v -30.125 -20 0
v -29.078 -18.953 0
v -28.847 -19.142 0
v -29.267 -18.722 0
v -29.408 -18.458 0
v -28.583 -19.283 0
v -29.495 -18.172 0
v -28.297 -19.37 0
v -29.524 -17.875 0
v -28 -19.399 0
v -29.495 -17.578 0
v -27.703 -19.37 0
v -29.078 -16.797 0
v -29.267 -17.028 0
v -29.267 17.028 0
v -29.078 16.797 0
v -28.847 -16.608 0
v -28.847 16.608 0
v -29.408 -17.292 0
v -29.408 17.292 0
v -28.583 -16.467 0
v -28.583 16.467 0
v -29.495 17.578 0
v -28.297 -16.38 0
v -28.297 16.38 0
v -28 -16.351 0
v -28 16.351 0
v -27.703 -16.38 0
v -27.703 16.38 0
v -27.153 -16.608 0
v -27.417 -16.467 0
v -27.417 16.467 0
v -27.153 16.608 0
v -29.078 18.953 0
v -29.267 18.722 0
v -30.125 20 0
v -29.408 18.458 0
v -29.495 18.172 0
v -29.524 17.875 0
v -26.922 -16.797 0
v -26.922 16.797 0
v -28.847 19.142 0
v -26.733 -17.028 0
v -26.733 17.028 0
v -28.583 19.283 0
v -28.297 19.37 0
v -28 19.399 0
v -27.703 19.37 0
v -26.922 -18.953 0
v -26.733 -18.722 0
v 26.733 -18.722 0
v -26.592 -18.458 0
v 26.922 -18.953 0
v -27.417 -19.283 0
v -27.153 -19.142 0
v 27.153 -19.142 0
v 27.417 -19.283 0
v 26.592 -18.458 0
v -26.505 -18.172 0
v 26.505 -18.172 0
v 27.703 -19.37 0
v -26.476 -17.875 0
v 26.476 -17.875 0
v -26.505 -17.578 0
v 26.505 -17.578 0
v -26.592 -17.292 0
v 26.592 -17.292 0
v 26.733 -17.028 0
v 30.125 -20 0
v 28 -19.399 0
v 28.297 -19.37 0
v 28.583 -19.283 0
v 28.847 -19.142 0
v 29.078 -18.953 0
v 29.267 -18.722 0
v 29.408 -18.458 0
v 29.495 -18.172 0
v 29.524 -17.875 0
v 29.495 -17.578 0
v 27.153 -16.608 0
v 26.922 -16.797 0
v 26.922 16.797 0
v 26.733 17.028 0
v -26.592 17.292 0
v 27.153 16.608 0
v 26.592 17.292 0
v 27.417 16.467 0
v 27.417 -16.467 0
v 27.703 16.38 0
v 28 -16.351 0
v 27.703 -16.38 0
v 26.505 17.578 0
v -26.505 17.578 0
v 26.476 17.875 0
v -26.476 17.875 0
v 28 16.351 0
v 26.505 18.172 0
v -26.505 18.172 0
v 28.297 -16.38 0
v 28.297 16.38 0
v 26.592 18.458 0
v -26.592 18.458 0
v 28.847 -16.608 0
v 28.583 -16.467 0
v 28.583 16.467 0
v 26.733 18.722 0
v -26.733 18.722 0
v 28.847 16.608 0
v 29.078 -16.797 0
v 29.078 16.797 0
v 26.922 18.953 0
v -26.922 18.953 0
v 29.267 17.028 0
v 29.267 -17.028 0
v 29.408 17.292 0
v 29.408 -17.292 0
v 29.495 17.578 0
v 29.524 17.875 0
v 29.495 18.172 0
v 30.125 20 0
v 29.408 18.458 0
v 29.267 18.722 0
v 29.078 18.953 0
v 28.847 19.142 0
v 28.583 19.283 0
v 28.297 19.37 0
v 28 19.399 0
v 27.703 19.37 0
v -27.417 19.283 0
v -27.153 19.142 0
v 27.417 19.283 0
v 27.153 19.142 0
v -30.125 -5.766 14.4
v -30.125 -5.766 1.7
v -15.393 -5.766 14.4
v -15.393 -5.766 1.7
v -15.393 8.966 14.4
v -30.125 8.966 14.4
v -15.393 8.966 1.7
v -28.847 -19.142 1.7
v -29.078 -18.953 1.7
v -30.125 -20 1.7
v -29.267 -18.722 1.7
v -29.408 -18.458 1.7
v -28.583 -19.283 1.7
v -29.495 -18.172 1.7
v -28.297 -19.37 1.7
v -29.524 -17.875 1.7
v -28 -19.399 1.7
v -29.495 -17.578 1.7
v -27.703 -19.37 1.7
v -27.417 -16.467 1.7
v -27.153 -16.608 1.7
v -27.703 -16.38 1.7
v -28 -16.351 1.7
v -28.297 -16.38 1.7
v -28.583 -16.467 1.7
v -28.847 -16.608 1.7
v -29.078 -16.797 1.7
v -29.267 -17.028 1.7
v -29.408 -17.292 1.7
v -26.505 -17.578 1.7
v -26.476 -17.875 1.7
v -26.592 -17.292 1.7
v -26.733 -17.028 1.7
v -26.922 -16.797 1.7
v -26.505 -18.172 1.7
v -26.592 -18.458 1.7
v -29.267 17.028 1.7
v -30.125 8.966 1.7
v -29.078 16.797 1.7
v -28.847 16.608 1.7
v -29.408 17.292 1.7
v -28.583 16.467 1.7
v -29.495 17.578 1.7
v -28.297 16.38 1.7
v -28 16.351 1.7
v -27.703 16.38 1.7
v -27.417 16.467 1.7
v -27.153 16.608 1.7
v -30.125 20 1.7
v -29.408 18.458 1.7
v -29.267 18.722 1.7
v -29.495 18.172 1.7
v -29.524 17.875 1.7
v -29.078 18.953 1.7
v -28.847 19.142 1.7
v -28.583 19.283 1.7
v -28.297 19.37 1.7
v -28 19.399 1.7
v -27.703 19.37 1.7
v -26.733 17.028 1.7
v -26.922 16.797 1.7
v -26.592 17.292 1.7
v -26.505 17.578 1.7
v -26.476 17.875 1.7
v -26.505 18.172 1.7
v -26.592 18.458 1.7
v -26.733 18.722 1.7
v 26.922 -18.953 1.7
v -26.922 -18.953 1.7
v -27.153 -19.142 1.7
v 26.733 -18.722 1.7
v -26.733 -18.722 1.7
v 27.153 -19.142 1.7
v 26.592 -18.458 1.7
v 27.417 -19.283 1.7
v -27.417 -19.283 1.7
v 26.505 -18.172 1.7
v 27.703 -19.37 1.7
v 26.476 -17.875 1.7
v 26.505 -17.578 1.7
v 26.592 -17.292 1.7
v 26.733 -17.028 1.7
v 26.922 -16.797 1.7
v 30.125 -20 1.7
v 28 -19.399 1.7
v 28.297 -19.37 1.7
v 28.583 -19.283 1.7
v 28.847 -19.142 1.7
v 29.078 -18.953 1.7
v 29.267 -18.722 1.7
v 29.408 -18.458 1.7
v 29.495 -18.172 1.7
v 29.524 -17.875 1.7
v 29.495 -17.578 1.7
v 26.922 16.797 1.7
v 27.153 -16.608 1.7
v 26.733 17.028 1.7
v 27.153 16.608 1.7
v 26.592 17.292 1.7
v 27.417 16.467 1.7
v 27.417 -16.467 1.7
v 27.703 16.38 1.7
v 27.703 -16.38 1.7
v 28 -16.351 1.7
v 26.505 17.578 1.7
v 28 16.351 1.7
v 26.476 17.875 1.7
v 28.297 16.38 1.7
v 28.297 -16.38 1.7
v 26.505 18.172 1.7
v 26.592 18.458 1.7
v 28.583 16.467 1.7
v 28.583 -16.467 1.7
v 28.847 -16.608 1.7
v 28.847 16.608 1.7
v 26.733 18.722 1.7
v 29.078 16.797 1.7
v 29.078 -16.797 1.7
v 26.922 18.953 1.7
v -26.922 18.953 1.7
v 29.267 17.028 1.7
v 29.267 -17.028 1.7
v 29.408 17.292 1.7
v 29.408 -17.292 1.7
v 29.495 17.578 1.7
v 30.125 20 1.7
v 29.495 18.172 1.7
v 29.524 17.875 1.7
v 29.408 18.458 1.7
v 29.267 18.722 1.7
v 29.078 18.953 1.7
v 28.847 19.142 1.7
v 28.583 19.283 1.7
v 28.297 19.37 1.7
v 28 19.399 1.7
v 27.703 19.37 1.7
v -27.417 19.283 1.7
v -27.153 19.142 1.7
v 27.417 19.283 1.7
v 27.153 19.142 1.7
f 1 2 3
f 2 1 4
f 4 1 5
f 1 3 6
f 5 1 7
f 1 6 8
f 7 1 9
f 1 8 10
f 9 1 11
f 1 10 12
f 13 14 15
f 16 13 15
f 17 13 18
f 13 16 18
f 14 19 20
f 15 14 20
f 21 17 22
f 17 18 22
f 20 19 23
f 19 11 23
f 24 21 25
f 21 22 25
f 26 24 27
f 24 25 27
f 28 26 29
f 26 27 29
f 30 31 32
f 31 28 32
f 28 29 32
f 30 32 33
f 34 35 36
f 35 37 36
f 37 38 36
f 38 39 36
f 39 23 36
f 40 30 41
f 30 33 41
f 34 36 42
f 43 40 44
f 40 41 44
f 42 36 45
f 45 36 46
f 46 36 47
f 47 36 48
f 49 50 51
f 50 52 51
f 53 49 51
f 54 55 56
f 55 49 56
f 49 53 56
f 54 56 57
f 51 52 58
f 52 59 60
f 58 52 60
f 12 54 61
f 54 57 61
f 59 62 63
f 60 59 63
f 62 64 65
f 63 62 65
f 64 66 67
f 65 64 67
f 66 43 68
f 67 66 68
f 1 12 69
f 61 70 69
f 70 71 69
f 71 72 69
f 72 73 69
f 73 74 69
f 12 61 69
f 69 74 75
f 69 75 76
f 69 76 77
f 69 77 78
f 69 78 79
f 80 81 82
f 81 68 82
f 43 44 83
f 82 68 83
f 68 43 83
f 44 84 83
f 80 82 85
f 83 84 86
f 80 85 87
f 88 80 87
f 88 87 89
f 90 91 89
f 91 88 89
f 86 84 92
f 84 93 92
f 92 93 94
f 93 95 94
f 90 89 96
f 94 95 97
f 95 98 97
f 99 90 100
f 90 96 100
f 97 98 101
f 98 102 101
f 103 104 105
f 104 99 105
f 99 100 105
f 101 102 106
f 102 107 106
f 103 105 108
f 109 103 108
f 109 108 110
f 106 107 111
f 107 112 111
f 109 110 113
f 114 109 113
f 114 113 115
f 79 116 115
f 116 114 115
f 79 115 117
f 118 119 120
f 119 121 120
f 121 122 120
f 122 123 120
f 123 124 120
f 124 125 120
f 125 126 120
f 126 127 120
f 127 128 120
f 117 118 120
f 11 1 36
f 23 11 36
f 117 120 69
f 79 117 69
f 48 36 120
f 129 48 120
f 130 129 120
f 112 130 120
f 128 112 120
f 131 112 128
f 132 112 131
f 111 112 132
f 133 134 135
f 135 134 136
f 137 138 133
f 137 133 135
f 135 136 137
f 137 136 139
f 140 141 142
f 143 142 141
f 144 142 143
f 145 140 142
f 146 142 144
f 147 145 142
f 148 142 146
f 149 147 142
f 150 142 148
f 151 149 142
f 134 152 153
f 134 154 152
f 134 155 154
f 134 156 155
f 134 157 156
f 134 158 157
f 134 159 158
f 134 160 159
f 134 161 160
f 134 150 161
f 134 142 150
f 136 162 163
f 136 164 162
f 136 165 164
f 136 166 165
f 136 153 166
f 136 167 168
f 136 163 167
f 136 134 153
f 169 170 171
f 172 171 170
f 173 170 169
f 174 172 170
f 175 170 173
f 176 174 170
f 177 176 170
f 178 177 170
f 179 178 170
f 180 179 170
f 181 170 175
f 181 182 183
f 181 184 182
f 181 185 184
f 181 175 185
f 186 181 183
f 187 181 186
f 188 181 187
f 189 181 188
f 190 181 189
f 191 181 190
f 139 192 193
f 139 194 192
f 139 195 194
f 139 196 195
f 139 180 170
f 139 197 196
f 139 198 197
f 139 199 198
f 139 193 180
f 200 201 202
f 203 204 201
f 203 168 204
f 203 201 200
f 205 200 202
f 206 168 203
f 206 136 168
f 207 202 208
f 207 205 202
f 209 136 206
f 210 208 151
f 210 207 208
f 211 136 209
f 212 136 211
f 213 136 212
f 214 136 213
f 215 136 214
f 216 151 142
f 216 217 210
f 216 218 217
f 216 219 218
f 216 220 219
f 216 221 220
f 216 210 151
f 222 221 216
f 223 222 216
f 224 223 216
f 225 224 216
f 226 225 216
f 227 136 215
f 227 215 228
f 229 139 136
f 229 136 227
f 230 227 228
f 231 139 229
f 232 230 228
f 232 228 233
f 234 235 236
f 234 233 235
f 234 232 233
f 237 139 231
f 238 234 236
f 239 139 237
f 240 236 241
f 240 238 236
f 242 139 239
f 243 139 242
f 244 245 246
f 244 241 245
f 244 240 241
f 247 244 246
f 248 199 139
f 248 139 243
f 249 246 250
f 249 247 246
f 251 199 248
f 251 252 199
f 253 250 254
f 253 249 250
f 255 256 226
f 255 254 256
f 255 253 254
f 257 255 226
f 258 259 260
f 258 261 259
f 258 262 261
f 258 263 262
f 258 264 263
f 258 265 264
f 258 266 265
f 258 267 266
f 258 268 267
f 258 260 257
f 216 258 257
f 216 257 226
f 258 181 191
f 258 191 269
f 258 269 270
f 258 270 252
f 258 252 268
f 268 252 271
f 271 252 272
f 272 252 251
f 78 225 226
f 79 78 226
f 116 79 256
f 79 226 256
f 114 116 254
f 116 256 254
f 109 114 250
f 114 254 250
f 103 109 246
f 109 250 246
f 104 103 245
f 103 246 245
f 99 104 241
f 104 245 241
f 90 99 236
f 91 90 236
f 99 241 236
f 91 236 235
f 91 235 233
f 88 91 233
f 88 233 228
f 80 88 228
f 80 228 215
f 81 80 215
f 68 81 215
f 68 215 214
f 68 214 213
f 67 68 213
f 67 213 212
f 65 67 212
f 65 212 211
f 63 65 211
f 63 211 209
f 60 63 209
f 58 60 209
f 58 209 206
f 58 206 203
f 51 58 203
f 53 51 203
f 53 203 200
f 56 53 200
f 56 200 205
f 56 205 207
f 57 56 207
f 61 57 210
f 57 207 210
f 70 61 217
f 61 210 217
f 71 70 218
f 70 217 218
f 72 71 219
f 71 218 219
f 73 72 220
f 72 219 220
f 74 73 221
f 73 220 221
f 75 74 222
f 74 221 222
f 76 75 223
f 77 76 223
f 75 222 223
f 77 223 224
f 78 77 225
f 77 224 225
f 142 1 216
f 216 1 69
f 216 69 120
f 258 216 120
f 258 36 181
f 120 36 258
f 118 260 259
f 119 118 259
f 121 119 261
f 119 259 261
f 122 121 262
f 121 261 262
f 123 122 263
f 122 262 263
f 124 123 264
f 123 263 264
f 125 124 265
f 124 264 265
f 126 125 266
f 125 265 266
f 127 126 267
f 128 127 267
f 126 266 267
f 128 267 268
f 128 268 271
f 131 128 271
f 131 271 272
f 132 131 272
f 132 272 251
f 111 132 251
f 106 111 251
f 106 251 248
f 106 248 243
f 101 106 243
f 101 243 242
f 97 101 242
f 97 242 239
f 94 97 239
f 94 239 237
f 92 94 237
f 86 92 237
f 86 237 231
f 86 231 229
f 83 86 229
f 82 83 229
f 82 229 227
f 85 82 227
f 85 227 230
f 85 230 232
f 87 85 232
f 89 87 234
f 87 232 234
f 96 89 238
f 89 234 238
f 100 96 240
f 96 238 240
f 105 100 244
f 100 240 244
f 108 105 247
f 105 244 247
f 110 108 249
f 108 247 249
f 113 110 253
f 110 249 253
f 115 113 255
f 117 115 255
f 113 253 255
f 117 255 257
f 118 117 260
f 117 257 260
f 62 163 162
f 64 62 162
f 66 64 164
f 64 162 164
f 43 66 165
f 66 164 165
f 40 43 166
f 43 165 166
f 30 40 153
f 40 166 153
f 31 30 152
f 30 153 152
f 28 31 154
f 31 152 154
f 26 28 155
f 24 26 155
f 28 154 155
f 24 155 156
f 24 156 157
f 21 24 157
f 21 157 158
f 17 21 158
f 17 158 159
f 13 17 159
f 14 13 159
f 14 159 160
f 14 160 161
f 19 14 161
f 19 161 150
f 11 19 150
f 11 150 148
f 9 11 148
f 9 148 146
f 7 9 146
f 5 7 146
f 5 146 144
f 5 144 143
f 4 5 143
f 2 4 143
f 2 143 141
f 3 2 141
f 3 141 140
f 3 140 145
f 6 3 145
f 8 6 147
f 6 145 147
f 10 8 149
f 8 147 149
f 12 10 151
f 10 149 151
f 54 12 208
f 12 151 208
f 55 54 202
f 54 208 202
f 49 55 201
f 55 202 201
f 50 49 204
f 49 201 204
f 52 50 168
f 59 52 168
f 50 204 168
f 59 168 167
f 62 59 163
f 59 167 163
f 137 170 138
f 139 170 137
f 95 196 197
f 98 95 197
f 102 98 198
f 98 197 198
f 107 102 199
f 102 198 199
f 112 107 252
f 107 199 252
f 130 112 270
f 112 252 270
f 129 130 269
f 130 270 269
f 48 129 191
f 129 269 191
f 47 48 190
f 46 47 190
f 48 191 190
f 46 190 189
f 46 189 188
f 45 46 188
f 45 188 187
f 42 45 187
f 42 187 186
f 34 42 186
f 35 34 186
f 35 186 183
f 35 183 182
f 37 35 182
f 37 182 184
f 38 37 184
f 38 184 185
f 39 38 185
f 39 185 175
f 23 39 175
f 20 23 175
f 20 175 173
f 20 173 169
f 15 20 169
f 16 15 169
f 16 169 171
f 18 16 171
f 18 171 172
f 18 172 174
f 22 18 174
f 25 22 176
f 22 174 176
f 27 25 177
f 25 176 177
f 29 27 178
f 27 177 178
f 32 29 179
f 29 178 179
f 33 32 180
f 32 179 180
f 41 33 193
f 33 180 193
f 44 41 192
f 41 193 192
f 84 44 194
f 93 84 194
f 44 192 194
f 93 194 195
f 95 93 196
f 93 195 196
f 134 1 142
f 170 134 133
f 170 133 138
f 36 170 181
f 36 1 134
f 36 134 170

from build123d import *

# Parameters (mm, degrees)
F0_W     = 60.25
F0_H     = 40
F1_DEPTH = 1.7
F2_R     = 1.524
F3_DEPTH = 1.701
F4_W     = 14.732
F4_H     = 14.732
F5_DEPTH = 12.7


with BuildPart() as f1:
    # F0 (on Top) → F1 (new body)
    with BuildSketch(Plane.XY):
        Rectangle(F0_W, F0_H)
    extrude(amount=F1_DEPTH)

    # F2 (on face) → F3 (cut, through all)
    with BuildSketch(Plane.XY.offset(1.7)):
        with Locations((-28, 17.875)):
            Circle(F2_R)
        with Locations((28, 17.875)):
            Circle(F2_R)
        with Locations((28, -17.875)):
            Circle(F2_R)
        with Locations((-28, -17.875)):
            Circle(F2_R)
    extrude(amount=-F3_DEPTH, mode=Mode.SUBTRACT)

    # F4 (on face) → F5 (join)
    with BuildSketch(Plane.XY.offset(1.7)):
        with Locations((-22.759, 1.6)):
            Rectangle(F4_W, F4_H)
    extrude(amount=F5_DEPTH)


solid = f1.part
